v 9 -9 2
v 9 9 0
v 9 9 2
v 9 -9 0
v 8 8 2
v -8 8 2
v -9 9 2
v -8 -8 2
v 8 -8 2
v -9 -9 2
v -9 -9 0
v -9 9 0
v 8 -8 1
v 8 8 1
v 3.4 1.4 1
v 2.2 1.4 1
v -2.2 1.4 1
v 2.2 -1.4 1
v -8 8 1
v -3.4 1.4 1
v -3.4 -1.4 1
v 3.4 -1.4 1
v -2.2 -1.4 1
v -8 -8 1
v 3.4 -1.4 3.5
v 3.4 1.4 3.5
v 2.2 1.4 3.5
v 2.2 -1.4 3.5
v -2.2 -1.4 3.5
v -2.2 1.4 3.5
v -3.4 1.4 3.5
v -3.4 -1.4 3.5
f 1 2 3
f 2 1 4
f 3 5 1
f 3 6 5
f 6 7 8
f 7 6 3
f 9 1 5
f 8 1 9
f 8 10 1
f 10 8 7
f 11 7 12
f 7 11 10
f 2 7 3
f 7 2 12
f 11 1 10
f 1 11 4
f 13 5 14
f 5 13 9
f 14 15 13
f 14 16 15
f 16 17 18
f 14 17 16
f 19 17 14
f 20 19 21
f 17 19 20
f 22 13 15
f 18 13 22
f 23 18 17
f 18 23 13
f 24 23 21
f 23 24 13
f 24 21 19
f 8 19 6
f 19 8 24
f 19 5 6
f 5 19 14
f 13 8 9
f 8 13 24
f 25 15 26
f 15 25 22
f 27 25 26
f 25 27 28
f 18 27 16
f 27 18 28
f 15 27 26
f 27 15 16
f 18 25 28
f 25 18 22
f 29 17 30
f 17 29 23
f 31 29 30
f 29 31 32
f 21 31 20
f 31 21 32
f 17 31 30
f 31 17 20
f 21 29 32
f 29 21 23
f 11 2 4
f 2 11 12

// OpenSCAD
inf = 100;

difference(){
  union(){
    difference(){
      cube([18,18,4],center=true);
      translate ([0,0,inf/2 + 1]) cube([16,16,inf],center=true);
    }
    translate ([2.8,0,0]) cube([1.2,2.8,7],center=true);
    translate ([-2.8,0,0]) cube([1.2,2.8,7],center=true);
  }
  translate([0,0,-1*inf/2]) cube([inf,inf,inf],center=true);
}
